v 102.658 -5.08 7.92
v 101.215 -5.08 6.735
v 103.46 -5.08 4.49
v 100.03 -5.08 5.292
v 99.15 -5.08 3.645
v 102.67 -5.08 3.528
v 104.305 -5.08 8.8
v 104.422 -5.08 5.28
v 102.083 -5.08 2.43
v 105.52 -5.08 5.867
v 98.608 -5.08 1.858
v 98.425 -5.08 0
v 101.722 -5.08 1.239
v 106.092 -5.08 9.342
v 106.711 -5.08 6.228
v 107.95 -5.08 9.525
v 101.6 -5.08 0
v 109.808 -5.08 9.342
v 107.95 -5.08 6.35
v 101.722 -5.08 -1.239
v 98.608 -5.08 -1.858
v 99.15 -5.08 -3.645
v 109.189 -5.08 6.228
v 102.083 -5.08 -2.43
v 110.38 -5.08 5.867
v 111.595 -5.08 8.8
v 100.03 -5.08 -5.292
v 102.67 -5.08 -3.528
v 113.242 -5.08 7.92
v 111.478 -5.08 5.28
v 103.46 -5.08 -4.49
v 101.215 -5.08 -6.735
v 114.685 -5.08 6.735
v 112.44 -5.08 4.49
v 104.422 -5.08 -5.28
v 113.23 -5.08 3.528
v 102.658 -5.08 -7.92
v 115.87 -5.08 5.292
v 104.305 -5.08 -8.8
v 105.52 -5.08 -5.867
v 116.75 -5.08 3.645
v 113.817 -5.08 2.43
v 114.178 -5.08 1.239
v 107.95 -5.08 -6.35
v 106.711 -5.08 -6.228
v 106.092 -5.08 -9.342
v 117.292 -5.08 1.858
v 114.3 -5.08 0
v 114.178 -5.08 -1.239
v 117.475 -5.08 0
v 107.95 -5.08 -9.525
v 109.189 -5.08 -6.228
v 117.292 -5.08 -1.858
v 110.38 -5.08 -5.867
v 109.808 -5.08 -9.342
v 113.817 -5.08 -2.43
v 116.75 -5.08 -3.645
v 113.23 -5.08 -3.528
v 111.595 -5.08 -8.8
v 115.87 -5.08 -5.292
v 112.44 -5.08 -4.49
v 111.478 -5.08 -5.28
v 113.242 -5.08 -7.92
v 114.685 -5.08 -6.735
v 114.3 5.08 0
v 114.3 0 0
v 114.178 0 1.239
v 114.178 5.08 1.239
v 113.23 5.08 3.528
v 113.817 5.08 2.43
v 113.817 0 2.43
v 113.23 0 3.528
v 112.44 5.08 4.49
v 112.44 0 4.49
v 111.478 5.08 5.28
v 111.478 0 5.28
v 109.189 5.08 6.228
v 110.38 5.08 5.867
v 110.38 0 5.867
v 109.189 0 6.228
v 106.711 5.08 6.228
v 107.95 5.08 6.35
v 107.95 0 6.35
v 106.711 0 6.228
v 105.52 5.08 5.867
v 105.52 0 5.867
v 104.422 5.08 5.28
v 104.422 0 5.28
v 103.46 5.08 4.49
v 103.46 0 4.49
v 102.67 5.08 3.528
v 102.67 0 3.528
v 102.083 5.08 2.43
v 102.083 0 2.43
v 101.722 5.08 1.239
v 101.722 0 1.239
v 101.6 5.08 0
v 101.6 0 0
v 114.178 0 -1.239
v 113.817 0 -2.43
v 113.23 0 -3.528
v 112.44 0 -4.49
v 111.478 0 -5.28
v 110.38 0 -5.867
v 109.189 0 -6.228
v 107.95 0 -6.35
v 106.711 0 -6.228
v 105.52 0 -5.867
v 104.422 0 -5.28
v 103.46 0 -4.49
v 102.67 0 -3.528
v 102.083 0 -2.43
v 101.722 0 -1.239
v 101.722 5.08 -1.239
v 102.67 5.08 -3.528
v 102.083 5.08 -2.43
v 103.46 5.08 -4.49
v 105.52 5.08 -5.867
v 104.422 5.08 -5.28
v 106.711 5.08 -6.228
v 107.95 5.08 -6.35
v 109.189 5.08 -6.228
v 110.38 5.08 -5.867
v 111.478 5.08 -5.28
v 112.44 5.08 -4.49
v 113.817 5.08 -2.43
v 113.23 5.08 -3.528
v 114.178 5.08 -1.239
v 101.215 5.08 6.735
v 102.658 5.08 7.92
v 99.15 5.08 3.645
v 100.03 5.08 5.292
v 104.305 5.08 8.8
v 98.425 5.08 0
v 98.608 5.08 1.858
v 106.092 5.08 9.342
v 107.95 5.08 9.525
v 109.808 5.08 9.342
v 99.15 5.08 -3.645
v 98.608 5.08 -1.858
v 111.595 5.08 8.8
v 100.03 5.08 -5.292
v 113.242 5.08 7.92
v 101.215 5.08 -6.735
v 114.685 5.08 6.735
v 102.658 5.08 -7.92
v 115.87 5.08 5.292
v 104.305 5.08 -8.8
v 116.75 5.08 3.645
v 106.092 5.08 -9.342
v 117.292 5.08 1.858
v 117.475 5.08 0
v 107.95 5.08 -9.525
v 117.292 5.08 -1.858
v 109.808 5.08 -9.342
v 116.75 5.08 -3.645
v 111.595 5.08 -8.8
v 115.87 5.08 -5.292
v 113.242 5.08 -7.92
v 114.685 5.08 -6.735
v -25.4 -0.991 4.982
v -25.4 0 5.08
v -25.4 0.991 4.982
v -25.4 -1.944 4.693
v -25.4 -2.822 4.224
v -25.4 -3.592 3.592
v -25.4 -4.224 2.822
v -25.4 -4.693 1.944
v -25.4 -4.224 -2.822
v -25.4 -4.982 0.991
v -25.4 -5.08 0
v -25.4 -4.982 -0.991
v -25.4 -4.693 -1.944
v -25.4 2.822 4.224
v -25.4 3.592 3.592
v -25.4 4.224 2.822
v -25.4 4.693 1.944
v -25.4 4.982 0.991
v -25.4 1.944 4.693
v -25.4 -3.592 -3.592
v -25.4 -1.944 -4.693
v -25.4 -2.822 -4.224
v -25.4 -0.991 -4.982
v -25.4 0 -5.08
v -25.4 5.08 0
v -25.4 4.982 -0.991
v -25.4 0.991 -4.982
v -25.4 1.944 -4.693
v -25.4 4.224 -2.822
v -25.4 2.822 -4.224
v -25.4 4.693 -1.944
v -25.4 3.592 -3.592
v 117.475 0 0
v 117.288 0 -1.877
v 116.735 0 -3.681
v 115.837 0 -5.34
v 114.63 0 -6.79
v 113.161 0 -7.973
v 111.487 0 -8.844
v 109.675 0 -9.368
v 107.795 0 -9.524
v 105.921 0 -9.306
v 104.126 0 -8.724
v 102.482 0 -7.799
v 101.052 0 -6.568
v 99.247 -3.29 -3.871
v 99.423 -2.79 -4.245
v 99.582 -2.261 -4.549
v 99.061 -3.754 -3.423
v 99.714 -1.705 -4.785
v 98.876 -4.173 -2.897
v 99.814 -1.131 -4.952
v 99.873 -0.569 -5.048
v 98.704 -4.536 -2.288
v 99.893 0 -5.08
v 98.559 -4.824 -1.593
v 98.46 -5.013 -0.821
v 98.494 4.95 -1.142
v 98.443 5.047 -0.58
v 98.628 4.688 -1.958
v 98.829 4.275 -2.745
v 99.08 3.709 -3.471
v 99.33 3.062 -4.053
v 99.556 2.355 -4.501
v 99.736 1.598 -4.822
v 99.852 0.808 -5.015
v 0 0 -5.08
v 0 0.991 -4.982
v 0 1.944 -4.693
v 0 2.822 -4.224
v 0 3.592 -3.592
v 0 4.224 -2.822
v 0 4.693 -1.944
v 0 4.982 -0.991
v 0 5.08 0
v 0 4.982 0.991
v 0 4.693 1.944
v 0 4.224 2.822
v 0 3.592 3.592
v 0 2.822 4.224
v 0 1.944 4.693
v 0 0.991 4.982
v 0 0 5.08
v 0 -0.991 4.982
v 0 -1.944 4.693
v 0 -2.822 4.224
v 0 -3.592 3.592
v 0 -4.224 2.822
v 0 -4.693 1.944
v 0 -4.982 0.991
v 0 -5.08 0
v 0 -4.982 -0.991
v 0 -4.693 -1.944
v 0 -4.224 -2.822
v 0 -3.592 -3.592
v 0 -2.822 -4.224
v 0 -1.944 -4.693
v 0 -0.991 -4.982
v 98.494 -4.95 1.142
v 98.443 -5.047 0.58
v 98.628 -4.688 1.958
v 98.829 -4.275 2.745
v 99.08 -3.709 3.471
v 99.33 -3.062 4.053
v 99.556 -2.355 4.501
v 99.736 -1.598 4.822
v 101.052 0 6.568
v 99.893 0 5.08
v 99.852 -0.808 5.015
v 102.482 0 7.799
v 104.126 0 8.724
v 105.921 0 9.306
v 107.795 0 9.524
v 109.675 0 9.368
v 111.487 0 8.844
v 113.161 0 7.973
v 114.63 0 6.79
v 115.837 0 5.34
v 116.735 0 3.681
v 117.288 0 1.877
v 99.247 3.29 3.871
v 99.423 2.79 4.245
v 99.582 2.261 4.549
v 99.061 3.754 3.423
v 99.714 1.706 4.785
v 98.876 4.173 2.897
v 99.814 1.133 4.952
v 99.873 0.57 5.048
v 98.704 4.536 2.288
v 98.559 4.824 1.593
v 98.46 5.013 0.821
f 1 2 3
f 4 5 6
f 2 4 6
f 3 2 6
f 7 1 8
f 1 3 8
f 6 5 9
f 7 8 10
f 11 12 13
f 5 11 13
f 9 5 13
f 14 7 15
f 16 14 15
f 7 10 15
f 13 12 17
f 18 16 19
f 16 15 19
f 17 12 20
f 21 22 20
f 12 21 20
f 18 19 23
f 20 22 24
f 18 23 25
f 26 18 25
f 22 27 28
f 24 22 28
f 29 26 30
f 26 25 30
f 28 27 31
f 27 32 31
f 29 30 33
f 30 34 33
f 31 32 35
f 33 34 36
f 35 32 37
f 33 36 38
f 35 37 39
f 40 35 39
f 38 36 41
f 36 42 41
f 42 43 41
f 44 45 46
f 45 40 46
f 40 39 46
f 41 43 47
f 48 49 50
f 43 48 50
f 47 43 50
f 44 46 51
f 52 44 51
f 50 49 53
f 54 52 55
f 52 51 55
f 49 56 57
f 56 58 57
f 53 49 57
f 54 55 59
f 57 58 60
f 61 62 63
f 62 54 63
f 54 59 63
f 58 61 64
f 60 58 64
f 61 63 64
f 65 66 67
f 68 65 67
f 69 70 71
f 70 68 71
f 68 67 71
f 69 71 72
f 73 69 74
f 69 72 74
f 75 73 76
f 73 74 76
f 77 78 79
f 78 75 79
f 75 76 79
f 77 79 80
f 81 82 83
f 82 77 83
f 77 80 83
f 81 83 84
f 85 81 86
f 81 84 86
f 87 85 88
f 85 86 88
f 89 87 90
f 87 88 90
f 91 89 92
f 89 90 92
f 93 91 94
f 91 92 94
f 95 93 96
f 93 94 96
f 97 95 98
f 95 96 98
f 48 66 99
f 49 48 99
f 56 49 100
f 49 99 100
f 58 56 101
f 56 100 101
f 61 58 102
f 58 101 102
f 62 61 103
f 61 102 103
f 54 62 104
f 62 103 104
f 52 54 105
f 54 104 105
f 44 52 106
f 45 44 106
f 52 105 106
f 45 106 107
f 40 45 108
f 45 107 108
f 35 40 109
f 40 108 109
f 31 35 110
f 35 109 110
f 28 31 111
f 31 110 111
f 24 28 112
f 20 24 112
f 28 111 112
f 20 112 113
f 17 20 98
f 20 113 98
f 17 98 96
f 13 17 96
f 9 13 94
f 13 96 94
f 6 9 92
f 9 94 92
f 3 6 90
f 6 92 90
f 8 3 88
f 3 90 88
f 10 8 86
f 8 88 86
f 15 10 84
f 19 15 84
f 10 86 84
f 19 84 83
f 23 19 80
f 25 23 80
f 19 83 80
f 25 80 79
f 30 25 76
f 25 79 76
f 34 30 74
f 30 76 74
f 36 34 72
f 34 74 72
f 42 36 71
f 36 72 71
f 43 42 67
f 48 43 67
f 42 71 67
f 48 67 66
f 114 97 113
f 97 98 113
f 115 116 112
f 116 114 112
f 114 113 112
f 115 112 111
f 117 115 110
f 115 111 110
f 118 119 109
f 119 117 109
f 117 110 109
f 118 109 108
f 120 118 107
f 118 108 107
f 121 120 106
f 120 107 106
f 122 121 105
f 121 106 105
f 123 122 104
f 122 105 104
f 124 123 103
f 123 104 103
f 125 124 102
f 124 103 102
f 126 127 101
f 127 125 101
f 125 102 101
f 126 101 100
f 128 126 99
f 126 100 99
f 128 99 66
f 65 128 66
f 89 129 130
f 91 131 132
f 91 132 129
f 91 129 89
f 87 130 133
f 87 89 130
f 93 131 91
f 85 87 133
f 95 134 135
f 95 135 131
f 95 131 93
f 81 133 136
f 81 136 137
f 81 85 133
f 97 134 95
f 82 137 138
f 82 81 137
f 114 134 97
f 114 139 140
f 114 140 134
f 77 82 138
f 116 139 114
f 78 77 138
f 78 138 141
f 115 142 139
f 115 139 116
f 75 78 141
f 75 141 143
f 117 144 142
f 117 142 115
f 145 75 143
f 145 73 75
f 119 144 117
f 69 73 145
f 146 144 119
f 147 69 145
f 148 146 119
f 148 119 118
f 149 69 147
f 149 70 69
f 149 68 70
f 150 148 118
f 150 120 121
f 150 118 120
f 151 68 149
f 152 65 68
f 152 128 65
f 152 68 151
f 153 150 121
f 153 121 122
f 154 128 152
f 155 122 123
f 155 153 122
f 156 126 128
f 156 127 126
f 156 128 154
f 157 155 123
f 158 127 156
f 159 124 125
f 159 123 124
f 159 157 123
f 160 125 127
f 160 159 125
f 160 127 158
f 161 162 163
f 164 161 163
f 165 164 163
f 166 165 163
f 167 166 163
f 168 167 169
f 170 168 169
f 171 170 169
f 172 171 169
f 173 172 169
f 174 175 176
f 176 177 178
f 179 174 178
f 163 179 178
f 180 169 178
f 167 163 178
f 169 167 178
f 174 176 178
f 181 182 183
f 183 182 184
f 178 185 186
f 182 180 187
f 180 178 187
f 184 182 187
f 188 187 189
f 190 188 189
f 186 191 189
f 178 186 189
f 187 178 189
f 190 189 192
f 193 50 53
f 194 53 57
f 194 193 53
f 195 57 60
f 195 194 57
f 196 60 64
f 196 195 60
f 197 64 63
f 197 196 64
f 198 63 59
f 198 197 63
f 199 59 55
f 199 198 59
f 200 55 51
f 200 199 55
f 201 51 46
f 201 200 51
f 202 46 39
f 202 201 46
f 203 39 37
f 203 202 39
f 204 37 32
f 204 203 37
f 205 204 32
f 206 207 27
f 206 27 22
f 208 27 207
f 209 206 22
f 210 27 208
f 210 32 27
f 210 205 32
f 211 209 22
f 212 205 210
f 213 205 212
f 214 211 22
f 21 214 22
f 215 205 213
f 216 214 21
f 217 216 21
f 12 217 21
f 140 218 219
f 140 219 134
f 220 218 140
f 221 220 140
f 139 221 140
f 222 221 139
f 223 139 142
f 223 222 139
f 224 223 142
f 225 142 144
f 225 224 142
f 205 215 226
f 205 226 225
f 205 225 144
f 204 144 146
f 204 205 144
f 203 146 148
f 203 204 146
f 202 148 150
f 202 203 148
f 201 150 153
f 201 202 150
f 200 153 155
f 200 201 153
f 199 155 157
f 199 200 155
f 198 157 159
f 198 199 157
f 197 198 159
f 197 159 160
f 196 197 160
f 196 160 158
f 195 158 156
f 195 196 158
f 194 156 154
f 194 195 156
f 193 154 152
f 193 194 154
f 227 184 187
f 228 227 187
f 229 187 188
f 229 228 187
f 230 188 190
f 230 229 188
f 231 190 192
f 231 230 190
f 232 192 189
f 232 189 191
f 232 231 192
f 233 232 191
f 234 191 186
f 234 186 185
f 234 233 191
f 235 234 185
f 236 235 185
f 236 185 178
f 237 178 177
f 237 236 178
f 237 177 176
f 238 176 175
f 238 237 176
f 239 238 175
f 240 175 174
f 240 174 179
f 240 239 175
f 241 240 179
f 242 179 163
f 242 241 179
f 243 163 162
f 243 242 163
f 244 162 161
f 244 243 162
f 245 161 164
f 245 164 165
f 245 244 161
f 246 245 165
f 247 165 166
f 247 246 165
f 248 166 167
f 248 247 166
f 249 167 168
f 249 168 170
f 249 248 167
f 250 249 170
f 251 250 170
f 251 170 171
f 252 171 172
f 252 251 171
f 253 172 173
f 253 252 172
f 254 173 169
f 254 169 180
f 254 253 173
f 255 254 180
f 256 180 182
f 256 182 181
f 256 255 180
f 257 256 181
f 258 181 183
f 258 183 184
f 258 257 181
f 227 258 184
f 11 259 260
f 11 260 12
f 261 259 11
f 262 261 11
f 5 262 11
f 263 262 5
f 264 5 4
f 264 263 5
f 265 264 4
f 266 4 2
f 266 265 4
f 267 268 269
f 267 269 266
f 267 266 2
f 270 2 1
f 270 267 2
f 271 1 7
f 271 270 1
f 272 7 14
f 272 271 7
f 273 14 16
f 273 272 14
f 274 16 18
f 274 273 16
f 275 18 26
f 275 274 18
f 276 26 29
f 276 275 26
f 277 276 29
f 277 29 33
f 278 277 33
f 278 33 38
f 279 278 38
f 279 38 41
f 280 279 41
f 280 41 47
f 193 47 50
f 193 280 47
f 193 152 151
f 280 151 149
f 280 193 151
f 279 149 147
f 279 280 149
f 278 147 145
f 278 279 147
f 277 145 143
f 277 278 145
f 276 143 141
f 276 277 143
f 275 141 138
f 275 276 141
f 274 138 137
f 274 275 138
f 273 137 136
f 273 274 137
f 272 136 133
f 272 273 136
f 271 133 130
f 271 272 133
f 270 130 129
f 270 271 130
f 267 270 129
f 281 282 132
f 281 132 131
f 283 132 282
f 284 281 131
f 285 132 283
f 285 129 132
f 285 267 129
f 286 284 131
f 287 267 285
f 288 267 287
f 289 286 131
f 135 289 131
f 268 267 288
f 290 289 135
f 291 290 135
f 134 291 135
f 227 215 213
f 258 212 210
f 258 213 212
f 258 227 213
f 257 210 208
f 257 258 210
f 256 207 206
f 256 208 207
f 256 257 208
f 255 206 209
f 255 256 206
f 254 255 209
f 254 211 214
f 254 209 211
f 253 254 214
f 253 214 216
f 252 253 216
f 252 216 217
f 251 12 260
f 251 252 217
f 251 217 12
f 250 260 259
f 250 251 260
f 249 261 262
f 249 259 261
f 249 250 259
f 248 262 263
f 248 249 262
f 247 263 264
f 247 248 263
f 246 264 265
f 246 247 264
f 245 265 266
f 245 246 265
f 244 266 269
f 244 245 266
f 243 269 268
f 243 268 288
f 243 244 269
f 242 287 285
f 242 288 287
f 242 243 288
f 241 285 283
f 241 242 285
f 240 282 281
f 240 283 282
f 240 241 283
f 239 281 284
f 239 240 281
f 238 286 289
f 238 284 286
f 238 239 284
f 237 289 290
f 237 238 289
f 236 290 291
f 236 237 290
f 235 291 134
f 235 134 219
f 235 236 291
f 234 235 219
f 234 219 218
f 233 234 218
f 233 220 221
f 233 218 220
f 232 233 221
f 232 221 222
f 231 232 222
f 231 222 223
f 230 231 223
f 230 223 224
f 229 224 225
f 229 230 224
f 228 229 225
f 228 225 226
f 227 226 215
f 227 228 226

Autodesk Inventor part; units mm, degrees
ref_plane "YZ Plane" through (0, 0, 0) normal (1, 0, 0) x (0, 1, 0)
ref_plane "XZ Plane" through (0, 0, 0) normal (0, 1, 0) x (-1, 0, 0)
ref_plane "XY Plane" through (0, 0, 0) normal (0, 0, 1) x (1, 0, 0)
ref_plane "Work Plane2" through (-6.35, 0, 0) normal (-1, 0, 0) x (0, 0, 1)
ref_plane "Work Plane3" through (0, 0, 0) normal (1, 0, 0) x (0, 0, -1)
sketch "Sketch3" plane through (0, 0, 0) normal (1, 0, 0) x (0, 0, -1)
  circle A0 centre (0, 0) radius 5.08
  dimension "d35" = 10.16
extrude "Extrusion2" add sketch "Sketch3" along normal blind 101.6 and the other way blind 25.4
sketch "Sketch5" plane through (101.6, 0, 0) normal (1, 0, 0) x (0, 0, -1)
  circle A0 centre (0, 0) radius 5.08 projected
ref_plane "Work Plane1" through (-6.35, 0, 18.2681) normal (0, 1, 0) x (1, 0, 0)
sketch "Sketch6" plane through (-6.35, 0, 18.2681) normal (0, 1, 0) x (1, 0, 0)
  point P0 (6.35, 18.2681)
sketch "Sketch7" plane through (-6.35, 0, 18.2681) normal (0, 1, 0) x (1, 0, 0)
  line L0 (107.95, 13.1881) -> (107.95, 23.3481) projected
  line L1 (107.95, 18.2681) -> (114.3, 18.2681)
  circle A0 centre (114.3, 18.2681) radius 6.35
  circle A1 centre (114.3, 18.2681) radius 9.525
  point P0 (6.35, 18.2681)
  dimension "d50" = 6.35
  dimension "d51" = 19.05
extrude "Extrusion4" add sketch "Sketch7" along normal mid plane 10.16
sketch "Sketch8" plane through (107.95, 5.08, 0) normal (0, 1, 0) x (1, 0, 0)
  point P0 (-107.95, 0)
equation "\"HR\" = 7.874"
equation "\"PR\" = 5.588"
equation "\"HA\" = 55deg"
properties part number "handle with hole"
